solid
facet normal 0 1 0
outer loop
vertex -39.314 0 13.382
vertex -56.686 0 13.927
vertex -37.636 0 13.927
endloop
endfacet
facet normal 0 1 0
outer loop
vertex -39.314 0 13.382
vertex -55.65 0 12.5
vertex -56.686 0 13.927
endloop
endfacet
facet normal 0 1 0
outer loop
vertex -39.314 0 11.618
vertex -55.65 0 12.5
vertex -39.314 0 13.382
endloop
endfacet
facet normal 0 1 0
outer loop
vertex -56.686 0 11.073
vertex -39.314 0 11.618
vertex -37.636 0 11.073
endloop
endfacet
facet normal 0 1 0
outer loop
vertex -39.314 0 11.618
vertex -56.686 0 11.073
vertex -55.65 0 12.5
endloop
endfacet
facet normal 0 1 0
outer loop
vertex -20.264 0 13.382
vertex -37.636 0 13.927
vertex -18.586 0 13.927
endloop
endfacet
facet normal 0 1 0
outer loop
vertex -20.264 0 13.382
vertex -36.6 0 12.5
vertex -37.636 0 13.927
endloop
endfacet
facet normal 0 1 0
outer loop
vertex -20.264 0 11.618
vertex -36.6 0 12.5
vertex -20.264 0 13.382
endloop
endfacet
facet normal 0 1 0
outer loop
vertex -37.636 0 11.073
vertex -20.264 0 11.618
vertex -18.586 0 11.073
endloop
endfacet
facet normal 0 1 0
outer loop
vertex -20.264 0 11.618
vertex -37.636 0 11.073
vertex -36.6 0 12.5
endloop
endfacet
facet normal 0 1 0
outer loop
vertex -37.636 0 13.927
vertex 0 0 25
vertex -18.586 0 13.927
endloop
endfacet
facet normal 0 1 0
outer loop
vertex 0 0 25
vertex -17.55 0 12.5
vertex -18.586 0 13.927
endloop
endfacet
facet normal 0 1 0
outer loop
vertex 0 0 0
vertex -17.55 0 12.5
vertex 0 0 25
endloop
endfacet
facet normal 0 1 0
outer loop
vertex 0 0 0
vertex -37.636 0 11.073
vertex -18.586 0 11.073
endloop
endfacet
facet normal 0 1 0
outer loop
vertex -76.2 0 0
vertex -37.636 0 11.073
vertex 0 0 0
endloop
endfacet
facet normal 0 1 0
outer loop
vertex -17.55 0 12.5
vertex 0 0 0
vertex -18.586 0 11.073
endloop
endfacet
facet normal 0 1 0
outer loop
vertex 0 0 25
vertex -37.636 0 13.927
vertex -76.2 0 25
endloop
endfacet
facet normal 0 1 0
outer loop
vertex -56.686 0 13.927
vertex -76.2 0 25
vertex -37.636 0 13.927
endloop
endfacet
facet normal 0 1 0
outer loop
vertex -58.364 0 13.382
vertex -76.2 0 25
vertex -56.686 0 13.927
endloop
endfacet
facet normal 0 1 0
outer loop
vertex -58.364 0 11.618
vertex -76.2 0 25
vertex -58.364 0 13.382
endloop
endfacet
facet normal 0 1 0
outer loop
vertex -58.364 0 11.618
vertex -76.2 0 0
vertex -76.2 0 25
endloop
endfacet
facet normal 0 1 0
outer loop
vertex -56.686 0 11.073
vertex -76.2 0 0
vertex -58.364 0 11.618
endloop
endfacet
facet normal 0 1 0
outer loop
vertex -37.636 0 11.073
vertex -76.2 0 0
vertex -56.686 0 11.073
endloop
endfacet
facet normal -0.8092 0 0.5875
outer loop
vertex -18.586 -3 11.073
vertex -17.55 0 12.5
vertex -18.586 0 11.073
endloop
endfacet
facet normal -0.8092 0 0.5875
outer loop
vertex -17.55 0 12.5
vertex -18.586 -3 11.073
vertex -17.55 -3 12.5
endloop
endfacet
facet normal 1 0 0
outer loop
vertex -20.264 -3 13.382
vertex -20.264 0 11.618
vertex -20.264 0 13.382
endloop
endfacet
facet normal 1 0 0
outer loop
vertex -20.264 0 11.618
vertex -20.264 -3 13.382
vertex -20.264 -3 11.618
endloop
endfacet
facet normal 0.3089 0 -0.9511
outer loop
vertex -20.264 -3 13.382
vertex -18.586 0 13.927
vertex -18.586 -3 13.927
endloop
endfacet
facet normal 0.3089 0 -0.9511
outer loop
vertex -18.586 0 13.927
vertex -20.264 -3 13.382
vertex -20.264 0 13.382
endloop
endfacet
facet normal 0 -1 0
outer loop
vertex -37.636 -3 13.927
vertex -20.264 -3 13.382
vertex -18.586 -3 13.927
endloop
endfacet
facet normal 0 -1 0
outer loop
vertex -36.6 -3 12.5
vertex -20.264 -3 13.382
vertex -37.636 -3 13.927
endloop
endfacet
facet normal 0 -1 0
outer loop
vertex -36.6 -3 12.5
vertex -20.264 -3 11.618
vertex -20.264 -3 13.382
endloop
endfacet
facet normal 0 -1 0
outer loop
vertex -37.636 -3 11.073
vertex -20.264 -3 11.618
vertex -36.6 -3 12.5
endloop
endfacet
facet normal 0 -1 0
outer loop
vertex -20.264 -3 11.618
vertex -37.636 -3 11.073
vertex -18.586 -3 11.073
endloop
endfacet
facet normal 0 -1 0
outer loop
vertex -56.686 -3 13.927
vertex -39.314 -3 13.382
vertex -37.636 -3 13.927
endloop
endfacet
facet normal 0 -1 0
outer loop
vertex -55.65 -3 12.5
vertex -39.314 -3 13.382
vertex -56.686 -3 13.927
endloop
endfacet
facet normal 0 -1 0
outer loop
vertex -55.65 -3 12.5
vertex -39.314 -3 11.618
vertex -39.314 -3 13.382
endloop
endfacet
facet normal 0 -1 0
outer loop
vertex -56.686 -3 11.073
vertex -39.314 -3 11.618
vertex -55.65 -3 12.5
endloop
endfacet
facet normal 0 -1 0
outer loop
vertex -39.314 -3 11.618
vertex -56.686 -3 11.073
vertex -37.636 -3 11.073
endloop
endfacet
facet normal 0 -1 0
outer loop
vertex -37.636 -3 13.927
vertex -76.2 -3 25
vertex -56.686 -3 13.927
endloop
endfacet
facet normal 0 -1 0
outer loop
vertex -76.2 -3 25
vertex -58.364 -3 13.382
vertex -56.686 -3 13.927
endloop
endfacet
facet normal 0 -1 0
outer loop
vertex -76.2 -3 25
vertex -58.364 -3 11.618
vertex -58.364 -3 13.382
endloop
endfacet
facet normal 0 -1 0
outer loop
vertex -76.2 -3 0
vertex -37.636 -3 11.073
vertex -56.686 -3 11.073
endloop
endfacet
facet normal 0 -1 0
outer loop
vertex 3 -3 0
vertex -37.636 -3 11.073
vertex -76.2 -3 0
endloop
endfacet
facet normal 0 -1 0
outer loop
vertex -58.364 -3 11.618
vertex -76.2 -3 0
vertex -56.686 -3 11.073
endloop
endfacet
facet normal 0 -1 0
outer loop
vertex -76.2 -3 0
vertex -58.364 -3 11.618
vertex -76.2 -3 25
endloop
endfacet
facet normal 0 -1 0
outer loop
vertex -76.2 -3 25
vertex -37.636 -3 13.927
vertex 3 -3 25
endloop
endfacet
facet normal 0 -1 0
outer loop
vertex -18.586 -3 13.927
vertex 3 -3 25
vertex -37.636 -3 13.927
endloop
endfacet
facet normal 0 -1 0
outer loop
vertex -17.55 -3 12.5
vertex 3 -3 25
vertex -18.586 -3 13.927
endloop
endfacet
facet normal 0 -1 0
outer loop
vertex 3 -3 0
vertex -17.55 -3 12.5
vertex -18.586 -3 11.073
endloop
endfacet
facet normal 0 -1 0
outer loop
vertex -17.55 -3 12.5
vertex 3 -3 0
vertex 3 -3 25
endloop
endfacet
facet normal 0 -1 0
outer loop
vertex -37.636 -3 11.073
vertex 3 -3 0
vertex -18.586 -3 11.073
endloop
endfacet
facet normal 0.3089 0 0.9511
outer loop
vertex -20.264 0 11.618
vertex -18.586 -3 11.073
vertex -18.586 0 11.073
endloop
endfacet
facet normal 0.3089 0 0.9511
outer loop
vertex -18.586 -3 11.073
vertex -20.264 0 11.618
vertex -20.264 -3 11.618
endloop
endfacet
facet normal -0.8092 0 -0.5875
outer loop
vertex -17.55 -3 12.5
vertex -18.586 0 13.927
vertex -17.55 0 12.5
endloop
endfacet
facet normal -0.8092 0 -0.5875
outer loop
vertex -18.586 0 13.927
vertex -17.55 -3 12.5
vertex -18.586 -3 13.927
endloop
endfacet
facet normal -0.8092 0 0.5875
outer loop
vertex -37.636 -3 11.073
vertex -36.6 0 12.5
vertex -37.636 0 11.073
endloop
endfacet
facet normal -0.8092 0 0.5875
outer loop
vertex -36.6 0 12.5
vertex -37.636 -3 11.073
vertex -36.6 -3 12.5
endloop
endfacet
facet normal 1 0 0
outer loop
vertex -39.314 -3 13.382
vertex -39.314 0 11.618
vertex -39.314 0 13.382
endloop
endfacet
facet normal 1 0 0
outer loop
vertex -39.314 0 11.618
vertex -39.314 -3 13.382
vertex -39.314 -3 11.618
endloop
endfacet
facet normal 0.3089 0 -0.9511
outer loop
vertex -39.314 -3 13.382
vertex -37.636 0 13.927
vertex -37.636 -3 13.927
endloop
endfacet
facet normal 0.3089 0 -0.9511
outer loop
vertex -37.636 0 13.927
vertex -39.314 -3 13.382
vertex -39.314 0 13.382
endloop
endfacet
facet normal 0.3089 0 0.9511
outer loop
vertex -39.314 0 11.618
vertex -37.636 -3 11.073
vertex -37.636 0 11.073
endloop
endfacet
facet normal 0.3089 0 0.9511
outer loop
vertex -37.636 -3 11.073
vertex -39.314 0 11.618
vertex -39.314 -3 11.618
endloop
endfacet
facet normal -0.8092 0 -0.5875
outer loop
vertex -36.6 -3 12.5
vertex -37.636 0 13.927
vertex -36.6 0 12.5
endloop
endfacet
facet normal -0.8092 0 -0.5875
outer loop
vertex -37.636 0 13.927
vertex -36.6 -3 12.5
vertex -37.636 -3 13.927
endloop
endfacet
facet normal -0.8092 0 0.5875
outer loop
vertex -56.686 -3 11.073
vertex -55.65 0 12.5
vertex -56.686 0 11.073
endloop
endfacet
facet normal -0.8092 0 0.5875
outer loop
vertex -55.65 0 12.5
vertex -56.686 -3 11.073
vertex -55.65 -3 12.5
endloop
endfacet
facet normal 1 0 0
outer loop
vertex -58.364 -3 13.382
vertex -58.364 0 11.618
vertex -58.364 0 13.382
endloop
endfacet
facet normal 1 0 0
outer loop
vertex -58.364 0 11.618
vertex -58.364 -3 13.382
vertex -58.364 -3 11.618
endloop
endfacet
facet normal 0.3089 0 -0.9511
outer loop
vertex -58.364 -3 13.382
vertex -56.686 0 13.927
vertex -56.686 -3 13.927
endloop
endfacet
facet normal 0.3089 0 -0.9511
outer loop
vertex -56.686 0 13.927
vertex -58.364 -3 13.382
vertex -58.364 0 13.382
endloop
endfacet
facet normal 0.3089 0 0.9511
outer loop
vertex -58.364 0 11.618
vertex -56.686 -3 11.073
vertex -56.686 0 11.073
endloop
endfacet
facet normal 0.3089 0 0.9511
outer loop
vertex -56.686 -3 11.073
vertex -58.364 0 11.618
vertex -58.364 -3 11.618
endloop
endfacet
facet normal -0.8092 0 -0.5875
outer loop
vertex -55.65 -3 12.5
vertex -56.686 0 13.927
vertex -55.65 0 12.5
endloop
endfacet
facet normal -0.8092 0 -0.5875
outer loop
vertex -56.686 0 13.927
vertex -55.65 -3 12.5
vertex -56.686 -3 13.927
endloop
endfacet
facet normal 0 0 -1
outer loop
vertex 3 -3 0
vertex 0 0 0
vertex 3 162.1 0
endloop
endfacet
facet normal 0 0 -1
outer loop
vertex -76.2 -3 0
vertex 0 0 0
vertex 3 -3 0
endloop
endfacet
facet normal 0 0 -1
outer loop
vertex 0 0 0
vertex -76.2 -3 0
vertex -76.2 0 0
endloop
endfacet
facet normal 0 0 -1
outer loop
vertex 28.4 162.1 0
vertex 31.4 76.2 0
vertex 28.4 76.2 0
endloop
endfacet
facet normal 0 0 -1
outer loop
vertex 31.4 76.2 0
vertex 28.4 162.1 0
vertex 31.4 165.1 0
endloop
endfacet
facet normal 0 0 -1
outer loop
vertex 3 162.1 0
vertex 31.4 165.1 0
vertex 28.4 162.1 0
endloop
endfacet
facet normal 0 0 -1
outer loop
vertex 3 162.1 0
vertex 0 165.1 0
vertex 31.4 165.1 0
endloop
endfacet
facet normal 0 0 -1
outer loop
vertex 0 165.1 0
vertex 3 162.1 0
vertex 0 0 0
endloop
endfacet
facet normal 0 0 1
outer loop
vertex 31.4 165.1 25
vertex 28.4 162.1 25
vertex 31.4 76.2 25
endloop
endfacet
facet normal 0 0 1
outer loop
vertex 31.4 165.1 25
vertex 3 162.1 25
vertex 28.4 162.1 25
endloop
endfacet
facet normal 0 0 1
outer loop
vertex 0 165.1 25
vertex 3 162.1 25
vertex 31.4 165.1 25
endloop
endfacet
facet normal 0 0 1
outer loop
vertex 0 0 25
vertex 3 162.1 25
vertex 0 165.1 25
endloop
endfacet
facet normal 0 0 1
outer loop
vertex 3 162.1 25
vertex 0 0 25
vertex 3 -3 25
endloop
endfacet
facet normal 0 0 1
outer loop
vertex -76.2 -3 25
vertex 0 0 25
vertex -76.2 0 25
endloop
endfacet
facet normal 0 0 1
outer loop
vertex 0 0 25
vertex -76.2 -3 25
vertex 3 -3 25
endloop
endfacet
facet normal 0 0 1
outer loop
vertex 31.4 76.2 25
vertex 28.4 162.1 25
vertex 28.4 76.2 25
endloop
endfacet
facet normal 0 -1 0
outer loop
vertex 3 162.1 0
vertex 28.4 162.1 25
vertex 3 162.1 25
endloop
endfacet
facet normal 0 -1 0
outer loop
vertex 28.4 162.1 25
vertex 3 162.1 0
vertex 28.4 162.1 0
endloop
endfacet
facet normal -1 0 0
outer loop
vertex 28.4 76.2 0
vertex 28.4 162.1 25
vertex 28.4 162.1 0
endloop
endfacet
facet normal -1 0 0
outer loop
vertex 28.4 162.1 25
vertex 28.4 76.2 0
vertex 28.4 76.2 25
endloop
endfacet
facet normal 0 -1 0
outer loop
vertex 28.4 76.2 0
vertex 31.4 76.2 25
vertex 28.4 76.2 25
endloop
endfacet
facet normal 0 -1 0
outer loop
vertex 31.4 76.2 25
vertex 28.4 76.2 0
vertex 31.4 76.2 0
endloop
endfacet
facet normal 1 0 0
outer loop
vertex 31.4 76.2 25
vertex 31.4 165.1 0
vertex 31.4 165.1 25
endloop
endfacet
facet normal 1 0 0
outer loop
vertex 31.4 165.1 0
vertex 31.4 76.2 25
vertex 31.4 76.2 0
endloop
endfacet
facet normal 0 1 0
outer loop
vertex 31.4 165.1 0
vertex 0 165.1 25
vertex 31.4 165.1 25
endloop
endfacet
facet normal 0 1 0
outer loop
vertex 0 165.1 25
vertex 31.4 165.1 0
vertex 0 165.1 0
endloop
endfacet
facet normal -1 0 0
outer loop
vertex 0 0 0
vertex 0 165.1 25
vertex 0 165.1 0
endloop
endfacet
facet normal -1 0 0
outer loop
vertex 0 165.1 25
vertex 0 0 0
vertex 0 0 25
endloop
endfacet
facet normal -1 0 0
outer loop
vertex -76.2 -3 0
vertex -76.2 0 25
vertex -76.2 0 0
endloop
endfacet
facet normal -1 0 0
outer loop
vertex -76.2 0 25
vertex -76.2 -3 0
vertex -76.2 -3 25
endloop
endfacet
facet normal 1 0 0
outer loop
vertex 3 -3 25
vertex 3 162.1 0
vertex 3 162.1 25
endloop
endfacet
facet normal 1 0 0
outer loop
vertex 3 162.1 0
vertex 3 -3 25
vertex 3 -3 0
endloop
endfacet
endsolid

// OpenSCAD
function in_to_mm(in) = in * 25.4;

HOOK_BODY_LENGTH = in_to_mm(6.5);
HOOK_THROAT_LENGTH = in_to_mm(1);
HOOK_CATCH_LENGTH = in_to_mm(3.5);
HOOK_MOUNT_LENGTH = in_to_mm(3);
HOOK_DEPTH = 25;

WALL_WIDTH = 3;

SCREW_DIAMETER = 3;

screw_count = 3;

module hook() {
    hook_points = [
        [0, 0],
        [0, HOOK_BODY_LENGTH],
        [HOOK_THROAT_LENGTH + WALL_WIDTH * 2, HOOK_BODY_LENGTH],
        [HOOK_THROAT_LENGTH + WALL_WIDTH * 2, HOOK_BODY_LENGTH - HOOK_CATCH_LENGTH],
        [HOOK_THROAT_LENGTH + WALL_WIDTH, HOOK_BODY_LENGTH - HOOK_CATCH_LENGTH],
        [HOOK_THROAT_LENGTH + WALL_WIDTH, HOOK_BODY_LENGTH - WALL_WIDTH],
        [WALL_WIDTH, HOOK_BODY_LENGTH - WALL_WIDTH],
        [WALL_WIDTH, -WALL_WIDTH],
        [-HOOK_MOUNT_LENGTH, -WALL_WIDTH],
        [-HOOK_MOUNT_LENGTH, 0]
    ];

    linear_extrude(HOOK_DEPTH)
    polygon(hook_points);
}

module mount_holes() {
    screw_offset = HOOK_MOUNT_LENGTH / (screw_count + 1);
    for (i = [1: screw_count]) {
        echo(i=i);
        translate([-screw_offset * i, 0, HOOK_DEPTH / 2])
        rotate([90, 0, 0])
        linear_extrude(WALL_WIDTH)
        circle(d=SCREW_DIAMETER);
    }
}

difference() {
    hook();
    mount_holes();
}
